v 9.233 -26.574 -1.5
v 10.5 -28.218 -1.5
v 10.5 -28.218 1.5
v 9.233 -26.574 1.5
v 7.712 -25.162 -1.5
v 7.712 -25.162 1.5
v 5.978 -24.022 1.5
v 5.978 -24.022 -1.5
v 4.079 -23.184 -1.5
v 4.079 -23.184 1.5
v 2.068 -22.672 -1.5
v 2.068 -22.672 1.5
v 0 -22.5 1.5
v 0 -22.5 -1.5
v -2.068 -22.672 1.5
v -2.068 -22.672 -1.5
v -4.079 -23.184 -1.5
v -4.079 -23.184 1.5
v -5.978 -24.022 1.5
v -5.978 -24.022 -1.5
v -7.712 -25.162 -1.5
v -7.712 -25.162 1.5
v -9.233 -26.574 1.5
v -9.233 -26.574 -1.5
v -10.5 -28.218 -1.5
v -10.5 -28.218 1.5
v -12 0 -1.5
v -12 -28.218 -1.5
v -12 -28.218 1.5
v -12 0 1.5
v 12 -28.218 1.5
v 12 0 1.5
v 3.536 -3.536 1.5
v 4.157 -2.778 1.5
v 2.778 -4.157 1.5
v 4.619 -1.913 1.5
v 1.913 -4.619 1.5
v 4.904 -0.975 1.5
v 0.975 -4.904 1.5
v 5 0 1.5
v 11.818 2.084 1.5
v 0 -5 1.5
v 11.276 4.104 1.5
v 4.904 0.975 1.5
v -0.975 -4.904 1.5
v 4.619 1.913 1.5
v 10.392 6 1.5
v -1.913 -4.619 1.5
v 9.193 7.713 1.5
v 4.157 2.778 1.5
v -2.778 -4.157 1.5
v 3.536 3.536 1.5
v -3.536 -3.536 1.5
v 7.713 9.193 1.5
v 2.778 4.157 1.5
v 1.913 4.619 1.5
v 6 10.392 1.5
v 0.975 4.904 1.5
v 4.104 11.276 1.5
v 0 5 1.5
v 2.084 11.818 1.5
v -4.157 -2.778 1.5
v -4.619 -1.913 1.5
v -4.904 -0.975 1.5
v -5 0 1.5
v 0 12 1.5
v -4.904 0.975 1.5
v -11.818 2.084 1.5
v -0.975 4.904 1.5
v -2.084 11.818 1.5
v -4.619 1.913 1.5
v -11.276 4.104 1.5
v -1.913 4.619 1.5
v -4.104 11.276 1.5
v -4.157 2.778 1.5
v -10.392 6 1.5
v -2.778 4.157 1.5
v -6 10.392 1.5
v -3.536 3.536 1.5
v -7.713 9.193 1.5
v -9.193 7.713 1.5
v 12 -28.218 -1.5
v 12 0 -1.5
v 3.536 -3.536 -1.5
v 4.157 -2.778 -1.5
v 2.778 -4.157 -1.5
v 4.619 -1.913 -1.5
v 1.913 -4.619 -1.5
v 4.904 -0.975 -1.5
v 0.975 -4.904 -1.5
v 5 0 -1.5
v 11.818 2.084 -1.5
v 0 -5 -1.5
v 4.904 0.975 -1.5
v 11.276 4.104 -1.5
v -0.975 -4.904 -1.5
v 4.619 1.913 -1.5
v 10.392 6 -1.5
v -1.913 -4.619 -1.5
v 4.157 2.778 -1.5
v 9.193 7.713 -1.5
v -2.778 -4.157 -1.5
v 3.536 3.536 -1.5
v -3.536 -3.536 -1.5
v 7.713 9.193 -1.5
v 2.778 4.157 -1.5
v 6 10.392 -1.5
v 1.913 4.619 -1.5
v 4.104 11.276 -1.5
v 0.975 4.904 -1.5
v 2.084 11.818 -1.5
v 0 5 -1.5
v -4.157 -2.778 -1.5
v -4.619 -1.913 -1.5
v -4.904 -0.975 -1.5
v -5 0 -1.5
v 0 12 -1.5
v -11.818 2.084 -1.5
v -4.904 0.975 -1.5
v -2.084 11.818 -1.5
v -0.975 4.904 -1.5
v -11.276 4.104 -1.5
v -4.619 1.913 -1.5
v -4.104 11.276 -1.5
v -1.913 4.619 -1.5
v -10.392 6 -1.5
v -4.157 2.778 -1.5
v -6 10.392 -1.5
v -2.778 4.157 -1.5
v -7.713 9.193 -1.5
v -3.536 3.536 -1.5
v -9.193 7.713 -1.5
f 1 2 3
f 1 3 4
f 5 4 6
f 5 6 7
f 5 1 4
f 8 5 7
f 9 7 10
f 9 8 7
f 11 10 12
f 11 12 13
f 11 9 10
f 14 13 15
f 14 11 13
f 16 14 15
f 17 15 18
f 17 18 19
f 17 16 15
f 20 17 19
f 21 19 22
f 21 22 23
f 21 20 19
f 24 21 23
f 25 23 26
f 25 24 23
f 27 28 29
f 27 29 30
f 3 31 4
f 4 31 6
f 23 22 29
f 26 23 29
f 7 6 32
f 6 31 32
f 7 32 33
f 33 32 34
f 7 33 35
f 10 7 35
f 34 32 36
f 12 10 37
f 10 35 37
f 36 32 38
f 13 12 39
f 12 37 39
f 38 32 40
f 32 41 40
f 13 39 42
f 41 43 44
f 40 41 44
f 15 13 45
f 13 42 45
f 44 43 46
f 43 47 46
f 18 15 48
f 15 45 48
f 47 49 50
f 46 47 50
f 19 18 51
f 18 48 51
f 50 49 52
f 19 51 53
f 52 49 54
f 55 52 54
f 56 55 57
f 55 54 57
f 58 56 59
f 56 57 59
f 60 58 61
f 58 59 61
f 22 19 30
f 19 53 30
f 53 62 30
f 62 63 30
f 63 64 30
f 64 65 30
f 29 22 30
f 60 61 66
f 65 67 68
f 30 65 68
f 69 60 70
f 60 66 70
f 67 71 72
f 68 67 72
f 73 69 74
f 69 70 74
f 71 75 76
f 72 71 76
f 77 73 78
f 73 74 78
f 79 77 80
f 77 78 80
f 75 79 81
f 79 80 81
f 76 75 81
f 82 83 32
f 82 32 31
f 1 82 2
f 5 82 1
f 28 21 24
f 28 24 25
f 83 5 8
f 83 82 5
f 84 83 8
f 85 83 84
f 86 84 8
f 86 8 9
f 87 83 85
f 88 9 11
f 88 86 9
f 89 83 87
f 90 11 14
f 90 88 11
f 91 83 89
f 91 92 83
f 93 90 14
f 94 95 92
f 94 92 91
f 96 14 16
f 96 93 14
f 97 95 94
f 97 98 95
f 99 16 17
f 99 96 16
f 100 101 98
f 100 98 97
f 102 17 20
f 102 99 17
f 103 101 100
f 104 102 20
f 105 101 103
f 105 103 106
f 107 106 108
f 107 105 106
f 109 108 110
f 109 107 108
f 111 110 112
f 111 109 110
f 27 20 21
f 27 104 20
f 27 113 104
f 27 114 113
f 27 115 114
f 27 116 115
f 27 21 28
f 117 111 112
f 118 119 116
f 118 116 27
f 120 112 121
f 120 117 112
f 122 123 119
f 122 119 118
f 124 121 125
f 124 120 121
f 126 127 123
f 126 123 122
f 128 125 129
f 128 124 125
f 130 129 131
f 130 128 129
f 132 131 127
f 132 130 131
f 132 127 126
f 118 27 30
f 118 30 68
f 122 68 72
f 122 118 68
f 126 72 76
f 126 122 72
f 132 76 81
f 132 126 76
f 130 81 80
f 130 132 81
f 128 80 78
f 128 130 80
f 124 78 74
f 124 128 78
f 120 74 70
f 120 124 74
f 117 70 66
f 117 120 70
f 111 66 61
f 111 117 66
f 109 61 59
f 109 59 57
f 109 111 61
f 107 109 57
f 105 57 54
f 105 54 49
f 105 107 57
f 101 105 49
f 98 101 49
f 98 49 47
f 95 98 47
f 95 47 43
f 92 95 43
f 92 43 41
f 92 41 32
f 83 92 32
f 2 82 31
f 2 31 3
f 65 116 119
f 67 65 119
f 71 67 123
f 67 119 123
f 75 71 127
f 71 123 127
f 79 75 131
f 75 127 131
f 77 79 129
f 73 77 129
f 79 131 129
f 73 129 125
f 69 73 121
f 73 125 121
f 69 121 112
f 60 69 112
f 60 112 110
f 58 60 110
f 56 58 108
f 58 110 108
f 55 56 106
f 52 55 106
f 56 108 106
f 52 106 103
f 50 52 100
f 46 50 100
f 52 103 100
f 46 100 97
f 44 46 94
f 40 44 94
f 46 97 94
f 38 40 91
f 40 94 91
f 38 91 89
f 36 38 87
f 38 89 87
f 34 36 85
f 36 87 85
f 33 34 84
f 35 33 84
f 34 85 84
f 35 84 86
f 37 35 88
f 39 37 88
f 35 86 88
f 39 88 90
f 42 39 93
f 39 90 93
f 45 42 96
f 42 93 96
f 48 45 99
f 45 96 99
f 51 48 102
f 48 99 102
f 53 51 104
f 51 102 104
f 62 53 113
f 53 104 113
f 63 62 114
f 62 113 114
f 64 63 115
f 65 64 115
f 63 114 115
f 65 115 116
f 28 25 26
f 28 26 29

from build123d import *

# Parameters (mm, degrees)
SZKIC1_R                    = 5
DODANIE_WYCI_GNI_CIE1_DEPTH = 3


with BuildPart() as part:
    # Szkic1 → Dodanie-wyciągnięcie1 (new body)
    with BuildSketch(Plane(origin=(0, 0, -1.5), x_dir=(-1, 0, 0), z_dir=(0, 0, -1))):
        with BuildLine():
            Line((-12, 0), (-12, -28.217670017))
            Line((-12, -28.217670017), (-10.5, -28.217670017))
            ThreePointArc((-10.5, -28.217670017), (0, -22.5), (10.5, -28.217670017))
            Line((10.5, -28.217670017), (12, -28.217670017))
            Line((12, -28.217670017), (12, 0))
            ThreePointArc((12, 0), (0, 12), (-12, 0))
        make_face()
        Circle(SZKIC1_R, mode=Mode.SUBTRACT)
    extrude(amount=-DODANIE_WYCI_GNI_CIE1_DEPTH)


solid = part.part
